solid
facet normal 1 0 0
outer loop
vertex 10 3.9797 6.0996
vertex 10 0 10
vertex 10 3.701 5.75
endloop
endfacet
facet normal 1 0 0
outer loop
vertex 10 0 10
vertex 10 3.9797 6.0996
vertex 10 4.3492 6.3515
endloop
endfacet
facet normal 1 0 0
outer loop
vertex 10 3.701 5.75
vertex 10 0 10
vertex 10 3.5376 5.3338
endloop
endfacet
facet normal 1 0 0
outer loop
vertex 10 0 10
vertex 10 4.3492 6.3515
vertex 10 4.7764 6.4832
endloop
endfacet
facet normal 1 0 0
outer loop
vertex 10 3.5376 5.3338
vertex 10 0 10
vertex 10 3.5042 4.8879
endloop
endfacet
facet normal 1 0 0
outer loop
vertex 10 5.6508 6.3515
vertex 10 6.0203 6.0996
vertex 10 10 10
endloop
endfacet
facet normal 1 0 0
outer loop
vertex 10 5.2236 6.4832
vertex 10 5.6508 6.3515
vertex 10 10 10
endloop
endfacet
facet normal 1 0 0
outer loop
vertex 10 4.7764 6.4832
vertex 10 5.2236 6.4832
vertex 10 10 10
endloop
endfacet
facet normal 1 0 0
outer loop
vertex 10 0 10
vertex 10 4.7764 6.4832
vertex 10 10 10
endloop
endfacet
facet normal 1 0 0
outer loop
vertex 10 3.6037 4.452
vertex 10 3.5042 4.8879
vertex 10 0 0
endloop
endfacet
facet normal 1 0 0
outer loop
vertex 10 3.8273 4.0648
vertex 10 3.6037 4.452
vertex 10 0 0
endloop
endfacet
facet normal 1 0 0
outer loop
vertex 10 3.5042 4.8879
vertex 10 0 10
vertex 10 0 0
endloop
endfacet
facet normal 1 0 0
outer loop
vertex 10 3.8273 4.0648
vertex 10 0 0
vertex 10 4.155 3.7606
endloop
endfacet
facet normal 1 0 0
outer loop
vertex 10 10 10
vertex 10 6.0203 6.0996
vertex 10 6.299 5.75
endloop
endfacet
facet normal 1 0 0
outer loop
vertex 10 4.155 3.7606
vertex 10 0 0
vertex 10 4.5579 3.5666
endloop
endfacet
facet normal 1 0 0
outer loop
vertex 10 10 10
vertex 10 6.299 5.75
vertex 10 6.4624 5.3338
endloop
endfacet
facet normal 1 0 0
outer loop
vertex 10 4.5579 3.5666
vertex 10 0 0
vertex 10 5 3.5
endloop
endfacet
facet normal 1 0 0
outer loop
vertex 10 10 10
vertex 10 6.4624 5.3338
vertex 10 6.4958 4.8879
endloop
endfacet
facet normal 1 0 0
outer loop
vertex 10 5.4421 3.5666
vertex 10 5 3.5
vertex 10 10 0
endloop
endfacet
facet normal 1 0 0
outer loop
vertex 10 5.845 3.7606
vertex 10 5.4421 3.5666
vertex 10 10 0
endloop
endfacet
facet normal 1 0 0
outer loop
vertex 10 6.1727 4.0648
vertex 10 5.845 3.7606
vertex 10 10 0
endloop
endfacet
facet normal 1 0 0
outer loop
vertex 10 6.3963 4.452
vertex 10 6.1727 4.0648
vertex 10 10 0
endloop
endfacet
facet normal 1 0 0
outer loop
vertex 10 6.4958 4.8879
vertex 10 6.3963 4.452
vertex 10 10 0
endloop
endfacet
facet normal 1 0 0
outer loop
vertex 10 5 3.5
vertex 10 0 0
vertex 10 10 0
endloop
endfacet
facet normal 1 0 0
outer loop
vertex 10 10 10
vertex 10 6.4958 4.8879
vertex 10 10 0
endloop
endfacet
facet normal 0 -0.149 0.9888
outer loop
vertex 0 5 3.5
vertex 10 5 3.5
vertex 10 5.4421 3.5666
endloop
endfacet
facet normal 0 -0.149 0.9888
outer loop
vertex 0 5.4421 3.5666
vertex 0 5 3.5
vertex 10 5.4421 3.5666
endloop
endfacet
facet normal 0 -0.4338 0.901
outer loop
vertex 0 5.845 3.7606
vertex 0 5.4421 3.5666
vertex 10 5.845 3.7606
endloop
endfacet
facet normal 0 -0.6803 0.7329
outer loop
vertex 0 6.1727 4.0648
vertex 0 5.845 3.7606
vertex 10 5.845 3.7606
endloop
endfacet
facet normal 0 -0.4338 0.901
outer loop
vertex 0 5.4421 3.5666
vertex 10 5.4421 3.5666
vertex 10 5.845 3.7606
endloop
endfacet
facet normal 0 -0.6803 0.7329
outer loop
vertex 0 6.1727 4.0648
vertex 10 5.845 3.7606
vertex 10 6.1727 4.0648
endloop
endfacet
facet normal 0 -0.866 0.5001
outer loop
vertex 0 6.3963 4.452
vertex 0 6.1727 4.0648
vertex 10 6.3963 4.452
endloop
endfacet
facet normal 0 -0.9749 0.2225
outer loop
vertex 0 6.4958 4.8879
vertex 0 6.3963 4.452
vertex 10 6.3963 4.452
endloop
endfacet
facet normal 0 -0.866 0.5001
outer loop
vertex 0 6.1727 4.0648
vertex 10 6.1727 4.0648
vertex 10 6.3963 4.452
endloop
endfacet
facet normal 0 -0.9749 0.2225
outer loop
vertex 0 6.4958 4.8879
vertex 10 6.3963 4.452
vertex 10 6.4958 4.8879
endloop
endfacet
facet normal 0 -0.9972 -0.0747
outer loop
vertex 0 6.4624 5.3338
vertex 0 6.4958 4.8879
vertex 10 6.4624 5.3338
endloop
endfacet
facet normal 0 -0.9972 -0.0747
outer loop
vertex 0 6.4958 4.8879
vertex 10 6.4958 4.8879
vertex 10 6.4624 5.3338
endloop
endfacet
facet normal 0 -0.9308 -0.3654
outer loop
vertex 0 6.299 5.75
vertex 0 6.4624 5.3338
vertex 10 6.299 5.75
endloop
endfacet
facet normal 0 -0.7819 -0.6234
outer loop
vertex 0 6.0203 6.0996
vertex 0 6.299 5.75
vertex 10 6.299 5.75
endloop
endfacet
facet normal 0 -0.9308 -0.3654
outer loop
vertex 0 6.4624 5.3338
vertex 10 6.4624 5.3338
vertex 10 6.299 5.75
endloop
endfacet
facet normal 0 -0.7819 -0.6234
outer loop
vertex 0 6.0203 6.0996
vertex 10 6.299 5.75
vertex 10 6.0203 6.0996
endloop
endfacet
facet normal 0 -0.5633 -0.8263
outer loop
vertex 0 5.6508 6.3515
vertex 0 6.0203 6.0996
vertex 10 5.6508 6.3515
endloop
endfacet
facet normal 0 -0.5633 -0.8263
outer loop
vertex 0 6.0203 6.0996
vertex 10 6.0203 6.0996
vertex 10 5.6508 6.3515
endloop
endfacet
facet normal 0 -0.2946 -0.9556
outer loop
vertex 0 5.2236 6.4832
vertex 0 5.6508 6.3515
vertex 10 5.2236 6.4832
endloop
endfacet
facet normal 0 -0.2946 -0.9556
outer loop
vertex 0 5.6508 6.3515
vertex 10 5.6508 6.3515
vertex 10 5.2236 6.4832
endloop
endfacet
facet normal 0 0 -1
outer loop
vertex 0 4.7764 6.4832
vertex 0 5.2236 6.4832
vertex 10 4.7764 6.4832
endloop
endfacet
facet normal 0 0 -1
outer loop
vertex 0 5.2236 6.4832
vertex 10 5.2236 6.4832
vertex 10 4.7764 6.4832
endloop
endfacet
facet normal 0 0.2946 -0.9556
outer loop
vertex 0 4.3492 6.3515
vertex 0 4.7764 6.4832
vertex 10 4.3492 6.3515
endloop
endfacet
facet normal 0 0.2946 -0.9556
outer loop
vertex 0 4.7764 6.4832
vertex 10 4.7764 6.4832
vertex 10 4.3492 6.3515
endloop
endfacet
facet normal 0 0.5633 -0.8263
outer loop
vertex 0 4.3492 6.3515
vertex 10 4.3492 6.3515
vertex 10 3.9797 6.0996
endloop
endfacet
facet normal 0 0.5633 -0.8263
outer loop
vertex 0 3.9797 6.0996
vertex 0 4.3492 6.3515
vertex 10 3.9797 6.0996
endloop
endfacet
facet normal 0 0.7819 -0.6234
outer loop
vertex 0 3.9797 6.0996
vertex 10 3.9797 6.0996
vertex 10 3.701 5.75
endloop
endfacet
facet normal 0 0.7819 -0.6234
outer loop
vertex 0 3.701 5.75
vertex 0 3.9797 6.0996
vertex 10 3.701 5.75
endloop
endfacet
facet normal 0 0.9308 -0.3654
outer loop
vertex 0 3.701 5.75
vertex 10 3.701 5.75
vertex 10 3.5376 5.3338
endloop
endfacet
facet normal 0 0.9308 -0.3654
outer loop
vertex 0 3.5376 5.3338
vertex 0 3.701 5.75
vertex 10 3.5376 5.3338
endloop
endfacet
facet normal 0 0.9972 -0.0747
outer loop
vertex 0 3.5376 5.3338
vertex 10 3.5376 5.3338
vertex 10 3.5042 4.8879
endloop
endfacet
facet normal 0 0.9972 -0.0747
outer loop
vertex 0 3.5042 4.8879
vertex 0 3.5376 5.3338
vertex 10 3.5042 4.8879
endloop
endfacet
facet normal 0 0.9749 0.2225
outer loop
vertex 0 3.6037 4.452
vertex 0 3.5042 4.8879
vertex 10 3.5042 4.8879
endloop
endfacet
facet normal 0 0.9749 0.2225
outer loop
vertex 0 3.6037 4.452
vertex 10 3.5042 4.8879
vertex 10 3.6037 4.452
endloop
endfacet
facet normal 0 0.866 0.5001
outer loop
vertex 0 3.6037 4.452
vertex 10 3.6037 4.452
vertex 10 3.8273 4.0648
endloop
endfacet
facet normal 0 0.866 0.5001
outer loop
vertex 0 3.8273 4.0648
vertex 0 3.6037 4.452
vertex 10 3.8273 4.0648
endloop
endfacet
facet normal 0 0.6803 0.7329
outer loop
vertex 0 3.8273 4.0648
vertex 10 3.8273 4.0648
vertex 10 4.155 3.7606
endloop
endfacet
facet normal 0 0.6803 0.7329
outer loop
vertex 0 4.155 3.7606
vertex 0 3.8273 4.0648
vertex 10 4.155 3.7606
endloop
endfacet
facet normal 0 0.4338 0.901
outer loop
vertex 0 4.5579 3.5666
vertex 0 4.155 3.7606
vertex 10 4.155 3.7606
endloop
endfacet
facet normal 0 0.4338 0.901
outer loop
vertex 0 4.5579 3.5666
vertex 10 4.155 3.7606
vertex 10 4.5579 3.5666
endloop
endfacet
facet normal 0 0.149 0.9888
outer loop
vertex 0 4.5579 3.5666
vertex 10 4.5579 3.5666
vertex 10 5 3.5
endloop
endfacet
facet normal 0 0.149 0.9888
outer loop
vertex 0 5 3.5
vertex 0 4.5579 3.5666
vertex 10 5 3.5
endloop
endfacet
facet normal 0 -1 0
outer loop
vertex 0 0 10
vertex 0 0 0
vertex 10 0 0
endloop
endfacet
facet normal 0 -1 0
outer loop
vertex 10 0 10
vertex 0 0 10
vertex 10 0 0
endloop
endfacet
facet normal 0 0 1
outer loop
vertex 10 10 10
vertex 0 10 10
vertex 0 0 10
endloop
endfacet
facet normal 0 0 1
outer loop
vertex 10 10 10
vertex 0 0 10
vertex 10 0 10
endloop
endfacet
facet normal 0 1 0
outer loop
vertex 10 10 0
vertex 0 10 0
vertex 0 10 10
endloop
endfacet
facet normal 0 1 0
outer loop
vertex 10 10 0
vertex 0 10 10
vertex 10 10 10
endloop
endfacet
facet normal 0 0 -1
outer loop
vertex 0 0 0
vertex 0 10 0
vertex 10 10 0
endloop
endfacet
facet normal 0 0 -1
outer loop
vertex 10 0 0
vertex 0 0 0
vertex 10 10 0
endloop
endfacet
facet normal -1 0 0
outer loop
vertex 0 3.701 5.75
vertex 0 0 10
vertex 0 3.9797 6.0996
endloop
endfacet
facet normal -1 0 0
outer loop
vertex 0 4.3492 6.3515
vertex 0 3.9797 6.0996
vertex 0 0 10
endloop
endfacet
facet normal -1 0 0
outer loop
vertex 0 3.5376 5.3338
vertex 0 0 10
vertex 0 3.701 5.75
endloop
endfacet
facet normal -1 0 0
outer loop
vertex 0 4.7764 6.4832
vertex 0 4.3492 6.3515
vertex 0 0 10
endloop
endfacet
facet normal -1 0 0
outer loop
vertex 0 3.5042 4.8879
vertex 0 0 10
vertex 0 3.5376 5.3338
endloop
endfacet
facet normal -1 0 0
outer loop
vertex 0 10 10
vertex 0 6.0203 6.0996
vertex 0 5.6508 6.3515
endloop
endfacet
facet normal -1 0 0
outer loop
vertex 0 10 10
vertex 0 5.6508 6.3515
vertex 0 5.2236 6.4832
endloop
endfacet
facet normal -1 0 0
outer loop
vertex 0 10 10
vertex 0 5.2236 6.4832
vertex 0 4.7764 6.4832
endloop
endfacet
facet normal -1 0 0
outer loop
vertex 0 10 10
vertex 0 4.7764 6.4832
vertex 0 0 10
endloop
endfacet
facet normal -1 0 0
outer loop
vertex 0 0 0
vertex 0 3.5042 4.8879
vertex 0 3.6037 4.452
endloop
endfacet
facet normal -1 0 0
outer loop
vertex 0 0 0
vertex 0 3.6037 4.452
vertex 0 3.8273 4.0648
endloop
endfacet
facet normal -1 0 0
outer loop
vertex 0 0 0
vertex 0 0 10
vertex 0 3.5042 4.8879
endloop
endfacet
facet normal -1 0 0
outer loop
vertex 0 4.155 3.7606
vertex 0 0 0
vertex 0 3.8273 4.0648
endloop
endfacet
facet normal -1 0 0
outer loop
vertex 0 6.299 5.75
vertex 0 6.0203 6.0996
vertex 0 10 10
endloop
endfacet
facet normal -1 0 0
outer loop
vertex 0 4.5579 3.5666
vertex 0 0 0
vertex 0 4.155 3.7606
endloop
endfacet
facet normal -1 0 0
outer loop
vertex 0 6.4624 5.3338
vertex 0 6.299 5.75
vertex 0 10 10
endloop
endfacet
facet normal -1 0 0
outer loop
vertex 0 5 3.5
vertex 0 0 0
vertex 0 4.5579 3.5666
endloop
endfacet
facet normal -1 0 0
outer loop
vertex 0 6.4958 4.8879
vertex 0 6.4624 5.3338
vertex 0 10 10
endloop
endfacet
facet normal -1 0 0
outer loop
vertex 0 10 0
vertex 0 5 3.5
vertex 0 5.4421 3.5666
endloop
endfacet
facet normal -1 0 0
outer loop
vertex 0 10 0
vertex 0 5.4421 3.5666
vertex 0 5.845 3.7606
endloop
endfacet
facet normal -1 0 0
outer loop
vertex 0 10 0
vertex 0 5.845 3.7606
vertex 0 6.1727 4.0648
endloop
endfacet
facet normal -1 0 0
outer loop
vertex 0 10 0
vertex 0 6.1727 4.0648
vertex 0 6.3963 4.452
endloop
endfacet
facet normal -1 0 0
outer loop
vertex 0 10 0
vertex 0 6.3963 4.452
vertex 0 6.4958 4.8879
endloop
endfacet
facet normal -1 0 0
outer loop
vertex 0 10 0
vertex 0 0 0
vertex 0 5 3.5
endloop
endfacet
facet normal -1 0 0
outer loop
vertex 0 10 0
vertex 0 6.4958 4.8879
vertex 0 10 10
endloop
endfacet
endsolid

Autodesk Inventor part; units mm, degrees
ref_plane "YZ Plane" through (0, 0, 0) normal (1, 0, 0) x (0, 1, 0)
ref_plane "XZ Plane" through (0, 0, 0) normal (0, 1, 0) x (-1, 0, 0)
ref_plane "XY Plane" through (0, 0, 0) normal (0, 0, 1) x (1, 0, 0)
sketch "Sketch1" plane through (0, 0, 0) normal (0, 0, 1) x (1, 0, 0)
  line L0 (0, 0) -> (10, 0)
  line L1 (-2, 0) -> (12, 0) construction
  line L2 (0, 0) -> (0, 10)
  line L3 (10, 0) -> (10, 10)
  line L4 (0, 10) -> (10, 10)
  dimension "d0" = 10
  dimension "d1" = 10
  dimension "d2" = 10
extrude "Extrusion1" add sketch "Sketch1" along normal blind 10
sketch "Sketch2" plane through (10, 0, 0) normal (1, 0, 0) x (0, 0, -1)
  circle A0 centre (-5, 5) radius 1.5
  line L0 (-10, 0) -> (-10, 10) projected
  line L1 (0, 0) -> (-10, 0) projected
  point P0 (-10, 5)
  point P1 (-5, 0)
  dimension "d5" = 3
extrude "Extrusion2" cut sketch "Sketch2" against normal up to surface (10 mm away)
equation "\"d1\" = d0"
equation "\"d2\" = d1"
properties part number "01Cubo"
